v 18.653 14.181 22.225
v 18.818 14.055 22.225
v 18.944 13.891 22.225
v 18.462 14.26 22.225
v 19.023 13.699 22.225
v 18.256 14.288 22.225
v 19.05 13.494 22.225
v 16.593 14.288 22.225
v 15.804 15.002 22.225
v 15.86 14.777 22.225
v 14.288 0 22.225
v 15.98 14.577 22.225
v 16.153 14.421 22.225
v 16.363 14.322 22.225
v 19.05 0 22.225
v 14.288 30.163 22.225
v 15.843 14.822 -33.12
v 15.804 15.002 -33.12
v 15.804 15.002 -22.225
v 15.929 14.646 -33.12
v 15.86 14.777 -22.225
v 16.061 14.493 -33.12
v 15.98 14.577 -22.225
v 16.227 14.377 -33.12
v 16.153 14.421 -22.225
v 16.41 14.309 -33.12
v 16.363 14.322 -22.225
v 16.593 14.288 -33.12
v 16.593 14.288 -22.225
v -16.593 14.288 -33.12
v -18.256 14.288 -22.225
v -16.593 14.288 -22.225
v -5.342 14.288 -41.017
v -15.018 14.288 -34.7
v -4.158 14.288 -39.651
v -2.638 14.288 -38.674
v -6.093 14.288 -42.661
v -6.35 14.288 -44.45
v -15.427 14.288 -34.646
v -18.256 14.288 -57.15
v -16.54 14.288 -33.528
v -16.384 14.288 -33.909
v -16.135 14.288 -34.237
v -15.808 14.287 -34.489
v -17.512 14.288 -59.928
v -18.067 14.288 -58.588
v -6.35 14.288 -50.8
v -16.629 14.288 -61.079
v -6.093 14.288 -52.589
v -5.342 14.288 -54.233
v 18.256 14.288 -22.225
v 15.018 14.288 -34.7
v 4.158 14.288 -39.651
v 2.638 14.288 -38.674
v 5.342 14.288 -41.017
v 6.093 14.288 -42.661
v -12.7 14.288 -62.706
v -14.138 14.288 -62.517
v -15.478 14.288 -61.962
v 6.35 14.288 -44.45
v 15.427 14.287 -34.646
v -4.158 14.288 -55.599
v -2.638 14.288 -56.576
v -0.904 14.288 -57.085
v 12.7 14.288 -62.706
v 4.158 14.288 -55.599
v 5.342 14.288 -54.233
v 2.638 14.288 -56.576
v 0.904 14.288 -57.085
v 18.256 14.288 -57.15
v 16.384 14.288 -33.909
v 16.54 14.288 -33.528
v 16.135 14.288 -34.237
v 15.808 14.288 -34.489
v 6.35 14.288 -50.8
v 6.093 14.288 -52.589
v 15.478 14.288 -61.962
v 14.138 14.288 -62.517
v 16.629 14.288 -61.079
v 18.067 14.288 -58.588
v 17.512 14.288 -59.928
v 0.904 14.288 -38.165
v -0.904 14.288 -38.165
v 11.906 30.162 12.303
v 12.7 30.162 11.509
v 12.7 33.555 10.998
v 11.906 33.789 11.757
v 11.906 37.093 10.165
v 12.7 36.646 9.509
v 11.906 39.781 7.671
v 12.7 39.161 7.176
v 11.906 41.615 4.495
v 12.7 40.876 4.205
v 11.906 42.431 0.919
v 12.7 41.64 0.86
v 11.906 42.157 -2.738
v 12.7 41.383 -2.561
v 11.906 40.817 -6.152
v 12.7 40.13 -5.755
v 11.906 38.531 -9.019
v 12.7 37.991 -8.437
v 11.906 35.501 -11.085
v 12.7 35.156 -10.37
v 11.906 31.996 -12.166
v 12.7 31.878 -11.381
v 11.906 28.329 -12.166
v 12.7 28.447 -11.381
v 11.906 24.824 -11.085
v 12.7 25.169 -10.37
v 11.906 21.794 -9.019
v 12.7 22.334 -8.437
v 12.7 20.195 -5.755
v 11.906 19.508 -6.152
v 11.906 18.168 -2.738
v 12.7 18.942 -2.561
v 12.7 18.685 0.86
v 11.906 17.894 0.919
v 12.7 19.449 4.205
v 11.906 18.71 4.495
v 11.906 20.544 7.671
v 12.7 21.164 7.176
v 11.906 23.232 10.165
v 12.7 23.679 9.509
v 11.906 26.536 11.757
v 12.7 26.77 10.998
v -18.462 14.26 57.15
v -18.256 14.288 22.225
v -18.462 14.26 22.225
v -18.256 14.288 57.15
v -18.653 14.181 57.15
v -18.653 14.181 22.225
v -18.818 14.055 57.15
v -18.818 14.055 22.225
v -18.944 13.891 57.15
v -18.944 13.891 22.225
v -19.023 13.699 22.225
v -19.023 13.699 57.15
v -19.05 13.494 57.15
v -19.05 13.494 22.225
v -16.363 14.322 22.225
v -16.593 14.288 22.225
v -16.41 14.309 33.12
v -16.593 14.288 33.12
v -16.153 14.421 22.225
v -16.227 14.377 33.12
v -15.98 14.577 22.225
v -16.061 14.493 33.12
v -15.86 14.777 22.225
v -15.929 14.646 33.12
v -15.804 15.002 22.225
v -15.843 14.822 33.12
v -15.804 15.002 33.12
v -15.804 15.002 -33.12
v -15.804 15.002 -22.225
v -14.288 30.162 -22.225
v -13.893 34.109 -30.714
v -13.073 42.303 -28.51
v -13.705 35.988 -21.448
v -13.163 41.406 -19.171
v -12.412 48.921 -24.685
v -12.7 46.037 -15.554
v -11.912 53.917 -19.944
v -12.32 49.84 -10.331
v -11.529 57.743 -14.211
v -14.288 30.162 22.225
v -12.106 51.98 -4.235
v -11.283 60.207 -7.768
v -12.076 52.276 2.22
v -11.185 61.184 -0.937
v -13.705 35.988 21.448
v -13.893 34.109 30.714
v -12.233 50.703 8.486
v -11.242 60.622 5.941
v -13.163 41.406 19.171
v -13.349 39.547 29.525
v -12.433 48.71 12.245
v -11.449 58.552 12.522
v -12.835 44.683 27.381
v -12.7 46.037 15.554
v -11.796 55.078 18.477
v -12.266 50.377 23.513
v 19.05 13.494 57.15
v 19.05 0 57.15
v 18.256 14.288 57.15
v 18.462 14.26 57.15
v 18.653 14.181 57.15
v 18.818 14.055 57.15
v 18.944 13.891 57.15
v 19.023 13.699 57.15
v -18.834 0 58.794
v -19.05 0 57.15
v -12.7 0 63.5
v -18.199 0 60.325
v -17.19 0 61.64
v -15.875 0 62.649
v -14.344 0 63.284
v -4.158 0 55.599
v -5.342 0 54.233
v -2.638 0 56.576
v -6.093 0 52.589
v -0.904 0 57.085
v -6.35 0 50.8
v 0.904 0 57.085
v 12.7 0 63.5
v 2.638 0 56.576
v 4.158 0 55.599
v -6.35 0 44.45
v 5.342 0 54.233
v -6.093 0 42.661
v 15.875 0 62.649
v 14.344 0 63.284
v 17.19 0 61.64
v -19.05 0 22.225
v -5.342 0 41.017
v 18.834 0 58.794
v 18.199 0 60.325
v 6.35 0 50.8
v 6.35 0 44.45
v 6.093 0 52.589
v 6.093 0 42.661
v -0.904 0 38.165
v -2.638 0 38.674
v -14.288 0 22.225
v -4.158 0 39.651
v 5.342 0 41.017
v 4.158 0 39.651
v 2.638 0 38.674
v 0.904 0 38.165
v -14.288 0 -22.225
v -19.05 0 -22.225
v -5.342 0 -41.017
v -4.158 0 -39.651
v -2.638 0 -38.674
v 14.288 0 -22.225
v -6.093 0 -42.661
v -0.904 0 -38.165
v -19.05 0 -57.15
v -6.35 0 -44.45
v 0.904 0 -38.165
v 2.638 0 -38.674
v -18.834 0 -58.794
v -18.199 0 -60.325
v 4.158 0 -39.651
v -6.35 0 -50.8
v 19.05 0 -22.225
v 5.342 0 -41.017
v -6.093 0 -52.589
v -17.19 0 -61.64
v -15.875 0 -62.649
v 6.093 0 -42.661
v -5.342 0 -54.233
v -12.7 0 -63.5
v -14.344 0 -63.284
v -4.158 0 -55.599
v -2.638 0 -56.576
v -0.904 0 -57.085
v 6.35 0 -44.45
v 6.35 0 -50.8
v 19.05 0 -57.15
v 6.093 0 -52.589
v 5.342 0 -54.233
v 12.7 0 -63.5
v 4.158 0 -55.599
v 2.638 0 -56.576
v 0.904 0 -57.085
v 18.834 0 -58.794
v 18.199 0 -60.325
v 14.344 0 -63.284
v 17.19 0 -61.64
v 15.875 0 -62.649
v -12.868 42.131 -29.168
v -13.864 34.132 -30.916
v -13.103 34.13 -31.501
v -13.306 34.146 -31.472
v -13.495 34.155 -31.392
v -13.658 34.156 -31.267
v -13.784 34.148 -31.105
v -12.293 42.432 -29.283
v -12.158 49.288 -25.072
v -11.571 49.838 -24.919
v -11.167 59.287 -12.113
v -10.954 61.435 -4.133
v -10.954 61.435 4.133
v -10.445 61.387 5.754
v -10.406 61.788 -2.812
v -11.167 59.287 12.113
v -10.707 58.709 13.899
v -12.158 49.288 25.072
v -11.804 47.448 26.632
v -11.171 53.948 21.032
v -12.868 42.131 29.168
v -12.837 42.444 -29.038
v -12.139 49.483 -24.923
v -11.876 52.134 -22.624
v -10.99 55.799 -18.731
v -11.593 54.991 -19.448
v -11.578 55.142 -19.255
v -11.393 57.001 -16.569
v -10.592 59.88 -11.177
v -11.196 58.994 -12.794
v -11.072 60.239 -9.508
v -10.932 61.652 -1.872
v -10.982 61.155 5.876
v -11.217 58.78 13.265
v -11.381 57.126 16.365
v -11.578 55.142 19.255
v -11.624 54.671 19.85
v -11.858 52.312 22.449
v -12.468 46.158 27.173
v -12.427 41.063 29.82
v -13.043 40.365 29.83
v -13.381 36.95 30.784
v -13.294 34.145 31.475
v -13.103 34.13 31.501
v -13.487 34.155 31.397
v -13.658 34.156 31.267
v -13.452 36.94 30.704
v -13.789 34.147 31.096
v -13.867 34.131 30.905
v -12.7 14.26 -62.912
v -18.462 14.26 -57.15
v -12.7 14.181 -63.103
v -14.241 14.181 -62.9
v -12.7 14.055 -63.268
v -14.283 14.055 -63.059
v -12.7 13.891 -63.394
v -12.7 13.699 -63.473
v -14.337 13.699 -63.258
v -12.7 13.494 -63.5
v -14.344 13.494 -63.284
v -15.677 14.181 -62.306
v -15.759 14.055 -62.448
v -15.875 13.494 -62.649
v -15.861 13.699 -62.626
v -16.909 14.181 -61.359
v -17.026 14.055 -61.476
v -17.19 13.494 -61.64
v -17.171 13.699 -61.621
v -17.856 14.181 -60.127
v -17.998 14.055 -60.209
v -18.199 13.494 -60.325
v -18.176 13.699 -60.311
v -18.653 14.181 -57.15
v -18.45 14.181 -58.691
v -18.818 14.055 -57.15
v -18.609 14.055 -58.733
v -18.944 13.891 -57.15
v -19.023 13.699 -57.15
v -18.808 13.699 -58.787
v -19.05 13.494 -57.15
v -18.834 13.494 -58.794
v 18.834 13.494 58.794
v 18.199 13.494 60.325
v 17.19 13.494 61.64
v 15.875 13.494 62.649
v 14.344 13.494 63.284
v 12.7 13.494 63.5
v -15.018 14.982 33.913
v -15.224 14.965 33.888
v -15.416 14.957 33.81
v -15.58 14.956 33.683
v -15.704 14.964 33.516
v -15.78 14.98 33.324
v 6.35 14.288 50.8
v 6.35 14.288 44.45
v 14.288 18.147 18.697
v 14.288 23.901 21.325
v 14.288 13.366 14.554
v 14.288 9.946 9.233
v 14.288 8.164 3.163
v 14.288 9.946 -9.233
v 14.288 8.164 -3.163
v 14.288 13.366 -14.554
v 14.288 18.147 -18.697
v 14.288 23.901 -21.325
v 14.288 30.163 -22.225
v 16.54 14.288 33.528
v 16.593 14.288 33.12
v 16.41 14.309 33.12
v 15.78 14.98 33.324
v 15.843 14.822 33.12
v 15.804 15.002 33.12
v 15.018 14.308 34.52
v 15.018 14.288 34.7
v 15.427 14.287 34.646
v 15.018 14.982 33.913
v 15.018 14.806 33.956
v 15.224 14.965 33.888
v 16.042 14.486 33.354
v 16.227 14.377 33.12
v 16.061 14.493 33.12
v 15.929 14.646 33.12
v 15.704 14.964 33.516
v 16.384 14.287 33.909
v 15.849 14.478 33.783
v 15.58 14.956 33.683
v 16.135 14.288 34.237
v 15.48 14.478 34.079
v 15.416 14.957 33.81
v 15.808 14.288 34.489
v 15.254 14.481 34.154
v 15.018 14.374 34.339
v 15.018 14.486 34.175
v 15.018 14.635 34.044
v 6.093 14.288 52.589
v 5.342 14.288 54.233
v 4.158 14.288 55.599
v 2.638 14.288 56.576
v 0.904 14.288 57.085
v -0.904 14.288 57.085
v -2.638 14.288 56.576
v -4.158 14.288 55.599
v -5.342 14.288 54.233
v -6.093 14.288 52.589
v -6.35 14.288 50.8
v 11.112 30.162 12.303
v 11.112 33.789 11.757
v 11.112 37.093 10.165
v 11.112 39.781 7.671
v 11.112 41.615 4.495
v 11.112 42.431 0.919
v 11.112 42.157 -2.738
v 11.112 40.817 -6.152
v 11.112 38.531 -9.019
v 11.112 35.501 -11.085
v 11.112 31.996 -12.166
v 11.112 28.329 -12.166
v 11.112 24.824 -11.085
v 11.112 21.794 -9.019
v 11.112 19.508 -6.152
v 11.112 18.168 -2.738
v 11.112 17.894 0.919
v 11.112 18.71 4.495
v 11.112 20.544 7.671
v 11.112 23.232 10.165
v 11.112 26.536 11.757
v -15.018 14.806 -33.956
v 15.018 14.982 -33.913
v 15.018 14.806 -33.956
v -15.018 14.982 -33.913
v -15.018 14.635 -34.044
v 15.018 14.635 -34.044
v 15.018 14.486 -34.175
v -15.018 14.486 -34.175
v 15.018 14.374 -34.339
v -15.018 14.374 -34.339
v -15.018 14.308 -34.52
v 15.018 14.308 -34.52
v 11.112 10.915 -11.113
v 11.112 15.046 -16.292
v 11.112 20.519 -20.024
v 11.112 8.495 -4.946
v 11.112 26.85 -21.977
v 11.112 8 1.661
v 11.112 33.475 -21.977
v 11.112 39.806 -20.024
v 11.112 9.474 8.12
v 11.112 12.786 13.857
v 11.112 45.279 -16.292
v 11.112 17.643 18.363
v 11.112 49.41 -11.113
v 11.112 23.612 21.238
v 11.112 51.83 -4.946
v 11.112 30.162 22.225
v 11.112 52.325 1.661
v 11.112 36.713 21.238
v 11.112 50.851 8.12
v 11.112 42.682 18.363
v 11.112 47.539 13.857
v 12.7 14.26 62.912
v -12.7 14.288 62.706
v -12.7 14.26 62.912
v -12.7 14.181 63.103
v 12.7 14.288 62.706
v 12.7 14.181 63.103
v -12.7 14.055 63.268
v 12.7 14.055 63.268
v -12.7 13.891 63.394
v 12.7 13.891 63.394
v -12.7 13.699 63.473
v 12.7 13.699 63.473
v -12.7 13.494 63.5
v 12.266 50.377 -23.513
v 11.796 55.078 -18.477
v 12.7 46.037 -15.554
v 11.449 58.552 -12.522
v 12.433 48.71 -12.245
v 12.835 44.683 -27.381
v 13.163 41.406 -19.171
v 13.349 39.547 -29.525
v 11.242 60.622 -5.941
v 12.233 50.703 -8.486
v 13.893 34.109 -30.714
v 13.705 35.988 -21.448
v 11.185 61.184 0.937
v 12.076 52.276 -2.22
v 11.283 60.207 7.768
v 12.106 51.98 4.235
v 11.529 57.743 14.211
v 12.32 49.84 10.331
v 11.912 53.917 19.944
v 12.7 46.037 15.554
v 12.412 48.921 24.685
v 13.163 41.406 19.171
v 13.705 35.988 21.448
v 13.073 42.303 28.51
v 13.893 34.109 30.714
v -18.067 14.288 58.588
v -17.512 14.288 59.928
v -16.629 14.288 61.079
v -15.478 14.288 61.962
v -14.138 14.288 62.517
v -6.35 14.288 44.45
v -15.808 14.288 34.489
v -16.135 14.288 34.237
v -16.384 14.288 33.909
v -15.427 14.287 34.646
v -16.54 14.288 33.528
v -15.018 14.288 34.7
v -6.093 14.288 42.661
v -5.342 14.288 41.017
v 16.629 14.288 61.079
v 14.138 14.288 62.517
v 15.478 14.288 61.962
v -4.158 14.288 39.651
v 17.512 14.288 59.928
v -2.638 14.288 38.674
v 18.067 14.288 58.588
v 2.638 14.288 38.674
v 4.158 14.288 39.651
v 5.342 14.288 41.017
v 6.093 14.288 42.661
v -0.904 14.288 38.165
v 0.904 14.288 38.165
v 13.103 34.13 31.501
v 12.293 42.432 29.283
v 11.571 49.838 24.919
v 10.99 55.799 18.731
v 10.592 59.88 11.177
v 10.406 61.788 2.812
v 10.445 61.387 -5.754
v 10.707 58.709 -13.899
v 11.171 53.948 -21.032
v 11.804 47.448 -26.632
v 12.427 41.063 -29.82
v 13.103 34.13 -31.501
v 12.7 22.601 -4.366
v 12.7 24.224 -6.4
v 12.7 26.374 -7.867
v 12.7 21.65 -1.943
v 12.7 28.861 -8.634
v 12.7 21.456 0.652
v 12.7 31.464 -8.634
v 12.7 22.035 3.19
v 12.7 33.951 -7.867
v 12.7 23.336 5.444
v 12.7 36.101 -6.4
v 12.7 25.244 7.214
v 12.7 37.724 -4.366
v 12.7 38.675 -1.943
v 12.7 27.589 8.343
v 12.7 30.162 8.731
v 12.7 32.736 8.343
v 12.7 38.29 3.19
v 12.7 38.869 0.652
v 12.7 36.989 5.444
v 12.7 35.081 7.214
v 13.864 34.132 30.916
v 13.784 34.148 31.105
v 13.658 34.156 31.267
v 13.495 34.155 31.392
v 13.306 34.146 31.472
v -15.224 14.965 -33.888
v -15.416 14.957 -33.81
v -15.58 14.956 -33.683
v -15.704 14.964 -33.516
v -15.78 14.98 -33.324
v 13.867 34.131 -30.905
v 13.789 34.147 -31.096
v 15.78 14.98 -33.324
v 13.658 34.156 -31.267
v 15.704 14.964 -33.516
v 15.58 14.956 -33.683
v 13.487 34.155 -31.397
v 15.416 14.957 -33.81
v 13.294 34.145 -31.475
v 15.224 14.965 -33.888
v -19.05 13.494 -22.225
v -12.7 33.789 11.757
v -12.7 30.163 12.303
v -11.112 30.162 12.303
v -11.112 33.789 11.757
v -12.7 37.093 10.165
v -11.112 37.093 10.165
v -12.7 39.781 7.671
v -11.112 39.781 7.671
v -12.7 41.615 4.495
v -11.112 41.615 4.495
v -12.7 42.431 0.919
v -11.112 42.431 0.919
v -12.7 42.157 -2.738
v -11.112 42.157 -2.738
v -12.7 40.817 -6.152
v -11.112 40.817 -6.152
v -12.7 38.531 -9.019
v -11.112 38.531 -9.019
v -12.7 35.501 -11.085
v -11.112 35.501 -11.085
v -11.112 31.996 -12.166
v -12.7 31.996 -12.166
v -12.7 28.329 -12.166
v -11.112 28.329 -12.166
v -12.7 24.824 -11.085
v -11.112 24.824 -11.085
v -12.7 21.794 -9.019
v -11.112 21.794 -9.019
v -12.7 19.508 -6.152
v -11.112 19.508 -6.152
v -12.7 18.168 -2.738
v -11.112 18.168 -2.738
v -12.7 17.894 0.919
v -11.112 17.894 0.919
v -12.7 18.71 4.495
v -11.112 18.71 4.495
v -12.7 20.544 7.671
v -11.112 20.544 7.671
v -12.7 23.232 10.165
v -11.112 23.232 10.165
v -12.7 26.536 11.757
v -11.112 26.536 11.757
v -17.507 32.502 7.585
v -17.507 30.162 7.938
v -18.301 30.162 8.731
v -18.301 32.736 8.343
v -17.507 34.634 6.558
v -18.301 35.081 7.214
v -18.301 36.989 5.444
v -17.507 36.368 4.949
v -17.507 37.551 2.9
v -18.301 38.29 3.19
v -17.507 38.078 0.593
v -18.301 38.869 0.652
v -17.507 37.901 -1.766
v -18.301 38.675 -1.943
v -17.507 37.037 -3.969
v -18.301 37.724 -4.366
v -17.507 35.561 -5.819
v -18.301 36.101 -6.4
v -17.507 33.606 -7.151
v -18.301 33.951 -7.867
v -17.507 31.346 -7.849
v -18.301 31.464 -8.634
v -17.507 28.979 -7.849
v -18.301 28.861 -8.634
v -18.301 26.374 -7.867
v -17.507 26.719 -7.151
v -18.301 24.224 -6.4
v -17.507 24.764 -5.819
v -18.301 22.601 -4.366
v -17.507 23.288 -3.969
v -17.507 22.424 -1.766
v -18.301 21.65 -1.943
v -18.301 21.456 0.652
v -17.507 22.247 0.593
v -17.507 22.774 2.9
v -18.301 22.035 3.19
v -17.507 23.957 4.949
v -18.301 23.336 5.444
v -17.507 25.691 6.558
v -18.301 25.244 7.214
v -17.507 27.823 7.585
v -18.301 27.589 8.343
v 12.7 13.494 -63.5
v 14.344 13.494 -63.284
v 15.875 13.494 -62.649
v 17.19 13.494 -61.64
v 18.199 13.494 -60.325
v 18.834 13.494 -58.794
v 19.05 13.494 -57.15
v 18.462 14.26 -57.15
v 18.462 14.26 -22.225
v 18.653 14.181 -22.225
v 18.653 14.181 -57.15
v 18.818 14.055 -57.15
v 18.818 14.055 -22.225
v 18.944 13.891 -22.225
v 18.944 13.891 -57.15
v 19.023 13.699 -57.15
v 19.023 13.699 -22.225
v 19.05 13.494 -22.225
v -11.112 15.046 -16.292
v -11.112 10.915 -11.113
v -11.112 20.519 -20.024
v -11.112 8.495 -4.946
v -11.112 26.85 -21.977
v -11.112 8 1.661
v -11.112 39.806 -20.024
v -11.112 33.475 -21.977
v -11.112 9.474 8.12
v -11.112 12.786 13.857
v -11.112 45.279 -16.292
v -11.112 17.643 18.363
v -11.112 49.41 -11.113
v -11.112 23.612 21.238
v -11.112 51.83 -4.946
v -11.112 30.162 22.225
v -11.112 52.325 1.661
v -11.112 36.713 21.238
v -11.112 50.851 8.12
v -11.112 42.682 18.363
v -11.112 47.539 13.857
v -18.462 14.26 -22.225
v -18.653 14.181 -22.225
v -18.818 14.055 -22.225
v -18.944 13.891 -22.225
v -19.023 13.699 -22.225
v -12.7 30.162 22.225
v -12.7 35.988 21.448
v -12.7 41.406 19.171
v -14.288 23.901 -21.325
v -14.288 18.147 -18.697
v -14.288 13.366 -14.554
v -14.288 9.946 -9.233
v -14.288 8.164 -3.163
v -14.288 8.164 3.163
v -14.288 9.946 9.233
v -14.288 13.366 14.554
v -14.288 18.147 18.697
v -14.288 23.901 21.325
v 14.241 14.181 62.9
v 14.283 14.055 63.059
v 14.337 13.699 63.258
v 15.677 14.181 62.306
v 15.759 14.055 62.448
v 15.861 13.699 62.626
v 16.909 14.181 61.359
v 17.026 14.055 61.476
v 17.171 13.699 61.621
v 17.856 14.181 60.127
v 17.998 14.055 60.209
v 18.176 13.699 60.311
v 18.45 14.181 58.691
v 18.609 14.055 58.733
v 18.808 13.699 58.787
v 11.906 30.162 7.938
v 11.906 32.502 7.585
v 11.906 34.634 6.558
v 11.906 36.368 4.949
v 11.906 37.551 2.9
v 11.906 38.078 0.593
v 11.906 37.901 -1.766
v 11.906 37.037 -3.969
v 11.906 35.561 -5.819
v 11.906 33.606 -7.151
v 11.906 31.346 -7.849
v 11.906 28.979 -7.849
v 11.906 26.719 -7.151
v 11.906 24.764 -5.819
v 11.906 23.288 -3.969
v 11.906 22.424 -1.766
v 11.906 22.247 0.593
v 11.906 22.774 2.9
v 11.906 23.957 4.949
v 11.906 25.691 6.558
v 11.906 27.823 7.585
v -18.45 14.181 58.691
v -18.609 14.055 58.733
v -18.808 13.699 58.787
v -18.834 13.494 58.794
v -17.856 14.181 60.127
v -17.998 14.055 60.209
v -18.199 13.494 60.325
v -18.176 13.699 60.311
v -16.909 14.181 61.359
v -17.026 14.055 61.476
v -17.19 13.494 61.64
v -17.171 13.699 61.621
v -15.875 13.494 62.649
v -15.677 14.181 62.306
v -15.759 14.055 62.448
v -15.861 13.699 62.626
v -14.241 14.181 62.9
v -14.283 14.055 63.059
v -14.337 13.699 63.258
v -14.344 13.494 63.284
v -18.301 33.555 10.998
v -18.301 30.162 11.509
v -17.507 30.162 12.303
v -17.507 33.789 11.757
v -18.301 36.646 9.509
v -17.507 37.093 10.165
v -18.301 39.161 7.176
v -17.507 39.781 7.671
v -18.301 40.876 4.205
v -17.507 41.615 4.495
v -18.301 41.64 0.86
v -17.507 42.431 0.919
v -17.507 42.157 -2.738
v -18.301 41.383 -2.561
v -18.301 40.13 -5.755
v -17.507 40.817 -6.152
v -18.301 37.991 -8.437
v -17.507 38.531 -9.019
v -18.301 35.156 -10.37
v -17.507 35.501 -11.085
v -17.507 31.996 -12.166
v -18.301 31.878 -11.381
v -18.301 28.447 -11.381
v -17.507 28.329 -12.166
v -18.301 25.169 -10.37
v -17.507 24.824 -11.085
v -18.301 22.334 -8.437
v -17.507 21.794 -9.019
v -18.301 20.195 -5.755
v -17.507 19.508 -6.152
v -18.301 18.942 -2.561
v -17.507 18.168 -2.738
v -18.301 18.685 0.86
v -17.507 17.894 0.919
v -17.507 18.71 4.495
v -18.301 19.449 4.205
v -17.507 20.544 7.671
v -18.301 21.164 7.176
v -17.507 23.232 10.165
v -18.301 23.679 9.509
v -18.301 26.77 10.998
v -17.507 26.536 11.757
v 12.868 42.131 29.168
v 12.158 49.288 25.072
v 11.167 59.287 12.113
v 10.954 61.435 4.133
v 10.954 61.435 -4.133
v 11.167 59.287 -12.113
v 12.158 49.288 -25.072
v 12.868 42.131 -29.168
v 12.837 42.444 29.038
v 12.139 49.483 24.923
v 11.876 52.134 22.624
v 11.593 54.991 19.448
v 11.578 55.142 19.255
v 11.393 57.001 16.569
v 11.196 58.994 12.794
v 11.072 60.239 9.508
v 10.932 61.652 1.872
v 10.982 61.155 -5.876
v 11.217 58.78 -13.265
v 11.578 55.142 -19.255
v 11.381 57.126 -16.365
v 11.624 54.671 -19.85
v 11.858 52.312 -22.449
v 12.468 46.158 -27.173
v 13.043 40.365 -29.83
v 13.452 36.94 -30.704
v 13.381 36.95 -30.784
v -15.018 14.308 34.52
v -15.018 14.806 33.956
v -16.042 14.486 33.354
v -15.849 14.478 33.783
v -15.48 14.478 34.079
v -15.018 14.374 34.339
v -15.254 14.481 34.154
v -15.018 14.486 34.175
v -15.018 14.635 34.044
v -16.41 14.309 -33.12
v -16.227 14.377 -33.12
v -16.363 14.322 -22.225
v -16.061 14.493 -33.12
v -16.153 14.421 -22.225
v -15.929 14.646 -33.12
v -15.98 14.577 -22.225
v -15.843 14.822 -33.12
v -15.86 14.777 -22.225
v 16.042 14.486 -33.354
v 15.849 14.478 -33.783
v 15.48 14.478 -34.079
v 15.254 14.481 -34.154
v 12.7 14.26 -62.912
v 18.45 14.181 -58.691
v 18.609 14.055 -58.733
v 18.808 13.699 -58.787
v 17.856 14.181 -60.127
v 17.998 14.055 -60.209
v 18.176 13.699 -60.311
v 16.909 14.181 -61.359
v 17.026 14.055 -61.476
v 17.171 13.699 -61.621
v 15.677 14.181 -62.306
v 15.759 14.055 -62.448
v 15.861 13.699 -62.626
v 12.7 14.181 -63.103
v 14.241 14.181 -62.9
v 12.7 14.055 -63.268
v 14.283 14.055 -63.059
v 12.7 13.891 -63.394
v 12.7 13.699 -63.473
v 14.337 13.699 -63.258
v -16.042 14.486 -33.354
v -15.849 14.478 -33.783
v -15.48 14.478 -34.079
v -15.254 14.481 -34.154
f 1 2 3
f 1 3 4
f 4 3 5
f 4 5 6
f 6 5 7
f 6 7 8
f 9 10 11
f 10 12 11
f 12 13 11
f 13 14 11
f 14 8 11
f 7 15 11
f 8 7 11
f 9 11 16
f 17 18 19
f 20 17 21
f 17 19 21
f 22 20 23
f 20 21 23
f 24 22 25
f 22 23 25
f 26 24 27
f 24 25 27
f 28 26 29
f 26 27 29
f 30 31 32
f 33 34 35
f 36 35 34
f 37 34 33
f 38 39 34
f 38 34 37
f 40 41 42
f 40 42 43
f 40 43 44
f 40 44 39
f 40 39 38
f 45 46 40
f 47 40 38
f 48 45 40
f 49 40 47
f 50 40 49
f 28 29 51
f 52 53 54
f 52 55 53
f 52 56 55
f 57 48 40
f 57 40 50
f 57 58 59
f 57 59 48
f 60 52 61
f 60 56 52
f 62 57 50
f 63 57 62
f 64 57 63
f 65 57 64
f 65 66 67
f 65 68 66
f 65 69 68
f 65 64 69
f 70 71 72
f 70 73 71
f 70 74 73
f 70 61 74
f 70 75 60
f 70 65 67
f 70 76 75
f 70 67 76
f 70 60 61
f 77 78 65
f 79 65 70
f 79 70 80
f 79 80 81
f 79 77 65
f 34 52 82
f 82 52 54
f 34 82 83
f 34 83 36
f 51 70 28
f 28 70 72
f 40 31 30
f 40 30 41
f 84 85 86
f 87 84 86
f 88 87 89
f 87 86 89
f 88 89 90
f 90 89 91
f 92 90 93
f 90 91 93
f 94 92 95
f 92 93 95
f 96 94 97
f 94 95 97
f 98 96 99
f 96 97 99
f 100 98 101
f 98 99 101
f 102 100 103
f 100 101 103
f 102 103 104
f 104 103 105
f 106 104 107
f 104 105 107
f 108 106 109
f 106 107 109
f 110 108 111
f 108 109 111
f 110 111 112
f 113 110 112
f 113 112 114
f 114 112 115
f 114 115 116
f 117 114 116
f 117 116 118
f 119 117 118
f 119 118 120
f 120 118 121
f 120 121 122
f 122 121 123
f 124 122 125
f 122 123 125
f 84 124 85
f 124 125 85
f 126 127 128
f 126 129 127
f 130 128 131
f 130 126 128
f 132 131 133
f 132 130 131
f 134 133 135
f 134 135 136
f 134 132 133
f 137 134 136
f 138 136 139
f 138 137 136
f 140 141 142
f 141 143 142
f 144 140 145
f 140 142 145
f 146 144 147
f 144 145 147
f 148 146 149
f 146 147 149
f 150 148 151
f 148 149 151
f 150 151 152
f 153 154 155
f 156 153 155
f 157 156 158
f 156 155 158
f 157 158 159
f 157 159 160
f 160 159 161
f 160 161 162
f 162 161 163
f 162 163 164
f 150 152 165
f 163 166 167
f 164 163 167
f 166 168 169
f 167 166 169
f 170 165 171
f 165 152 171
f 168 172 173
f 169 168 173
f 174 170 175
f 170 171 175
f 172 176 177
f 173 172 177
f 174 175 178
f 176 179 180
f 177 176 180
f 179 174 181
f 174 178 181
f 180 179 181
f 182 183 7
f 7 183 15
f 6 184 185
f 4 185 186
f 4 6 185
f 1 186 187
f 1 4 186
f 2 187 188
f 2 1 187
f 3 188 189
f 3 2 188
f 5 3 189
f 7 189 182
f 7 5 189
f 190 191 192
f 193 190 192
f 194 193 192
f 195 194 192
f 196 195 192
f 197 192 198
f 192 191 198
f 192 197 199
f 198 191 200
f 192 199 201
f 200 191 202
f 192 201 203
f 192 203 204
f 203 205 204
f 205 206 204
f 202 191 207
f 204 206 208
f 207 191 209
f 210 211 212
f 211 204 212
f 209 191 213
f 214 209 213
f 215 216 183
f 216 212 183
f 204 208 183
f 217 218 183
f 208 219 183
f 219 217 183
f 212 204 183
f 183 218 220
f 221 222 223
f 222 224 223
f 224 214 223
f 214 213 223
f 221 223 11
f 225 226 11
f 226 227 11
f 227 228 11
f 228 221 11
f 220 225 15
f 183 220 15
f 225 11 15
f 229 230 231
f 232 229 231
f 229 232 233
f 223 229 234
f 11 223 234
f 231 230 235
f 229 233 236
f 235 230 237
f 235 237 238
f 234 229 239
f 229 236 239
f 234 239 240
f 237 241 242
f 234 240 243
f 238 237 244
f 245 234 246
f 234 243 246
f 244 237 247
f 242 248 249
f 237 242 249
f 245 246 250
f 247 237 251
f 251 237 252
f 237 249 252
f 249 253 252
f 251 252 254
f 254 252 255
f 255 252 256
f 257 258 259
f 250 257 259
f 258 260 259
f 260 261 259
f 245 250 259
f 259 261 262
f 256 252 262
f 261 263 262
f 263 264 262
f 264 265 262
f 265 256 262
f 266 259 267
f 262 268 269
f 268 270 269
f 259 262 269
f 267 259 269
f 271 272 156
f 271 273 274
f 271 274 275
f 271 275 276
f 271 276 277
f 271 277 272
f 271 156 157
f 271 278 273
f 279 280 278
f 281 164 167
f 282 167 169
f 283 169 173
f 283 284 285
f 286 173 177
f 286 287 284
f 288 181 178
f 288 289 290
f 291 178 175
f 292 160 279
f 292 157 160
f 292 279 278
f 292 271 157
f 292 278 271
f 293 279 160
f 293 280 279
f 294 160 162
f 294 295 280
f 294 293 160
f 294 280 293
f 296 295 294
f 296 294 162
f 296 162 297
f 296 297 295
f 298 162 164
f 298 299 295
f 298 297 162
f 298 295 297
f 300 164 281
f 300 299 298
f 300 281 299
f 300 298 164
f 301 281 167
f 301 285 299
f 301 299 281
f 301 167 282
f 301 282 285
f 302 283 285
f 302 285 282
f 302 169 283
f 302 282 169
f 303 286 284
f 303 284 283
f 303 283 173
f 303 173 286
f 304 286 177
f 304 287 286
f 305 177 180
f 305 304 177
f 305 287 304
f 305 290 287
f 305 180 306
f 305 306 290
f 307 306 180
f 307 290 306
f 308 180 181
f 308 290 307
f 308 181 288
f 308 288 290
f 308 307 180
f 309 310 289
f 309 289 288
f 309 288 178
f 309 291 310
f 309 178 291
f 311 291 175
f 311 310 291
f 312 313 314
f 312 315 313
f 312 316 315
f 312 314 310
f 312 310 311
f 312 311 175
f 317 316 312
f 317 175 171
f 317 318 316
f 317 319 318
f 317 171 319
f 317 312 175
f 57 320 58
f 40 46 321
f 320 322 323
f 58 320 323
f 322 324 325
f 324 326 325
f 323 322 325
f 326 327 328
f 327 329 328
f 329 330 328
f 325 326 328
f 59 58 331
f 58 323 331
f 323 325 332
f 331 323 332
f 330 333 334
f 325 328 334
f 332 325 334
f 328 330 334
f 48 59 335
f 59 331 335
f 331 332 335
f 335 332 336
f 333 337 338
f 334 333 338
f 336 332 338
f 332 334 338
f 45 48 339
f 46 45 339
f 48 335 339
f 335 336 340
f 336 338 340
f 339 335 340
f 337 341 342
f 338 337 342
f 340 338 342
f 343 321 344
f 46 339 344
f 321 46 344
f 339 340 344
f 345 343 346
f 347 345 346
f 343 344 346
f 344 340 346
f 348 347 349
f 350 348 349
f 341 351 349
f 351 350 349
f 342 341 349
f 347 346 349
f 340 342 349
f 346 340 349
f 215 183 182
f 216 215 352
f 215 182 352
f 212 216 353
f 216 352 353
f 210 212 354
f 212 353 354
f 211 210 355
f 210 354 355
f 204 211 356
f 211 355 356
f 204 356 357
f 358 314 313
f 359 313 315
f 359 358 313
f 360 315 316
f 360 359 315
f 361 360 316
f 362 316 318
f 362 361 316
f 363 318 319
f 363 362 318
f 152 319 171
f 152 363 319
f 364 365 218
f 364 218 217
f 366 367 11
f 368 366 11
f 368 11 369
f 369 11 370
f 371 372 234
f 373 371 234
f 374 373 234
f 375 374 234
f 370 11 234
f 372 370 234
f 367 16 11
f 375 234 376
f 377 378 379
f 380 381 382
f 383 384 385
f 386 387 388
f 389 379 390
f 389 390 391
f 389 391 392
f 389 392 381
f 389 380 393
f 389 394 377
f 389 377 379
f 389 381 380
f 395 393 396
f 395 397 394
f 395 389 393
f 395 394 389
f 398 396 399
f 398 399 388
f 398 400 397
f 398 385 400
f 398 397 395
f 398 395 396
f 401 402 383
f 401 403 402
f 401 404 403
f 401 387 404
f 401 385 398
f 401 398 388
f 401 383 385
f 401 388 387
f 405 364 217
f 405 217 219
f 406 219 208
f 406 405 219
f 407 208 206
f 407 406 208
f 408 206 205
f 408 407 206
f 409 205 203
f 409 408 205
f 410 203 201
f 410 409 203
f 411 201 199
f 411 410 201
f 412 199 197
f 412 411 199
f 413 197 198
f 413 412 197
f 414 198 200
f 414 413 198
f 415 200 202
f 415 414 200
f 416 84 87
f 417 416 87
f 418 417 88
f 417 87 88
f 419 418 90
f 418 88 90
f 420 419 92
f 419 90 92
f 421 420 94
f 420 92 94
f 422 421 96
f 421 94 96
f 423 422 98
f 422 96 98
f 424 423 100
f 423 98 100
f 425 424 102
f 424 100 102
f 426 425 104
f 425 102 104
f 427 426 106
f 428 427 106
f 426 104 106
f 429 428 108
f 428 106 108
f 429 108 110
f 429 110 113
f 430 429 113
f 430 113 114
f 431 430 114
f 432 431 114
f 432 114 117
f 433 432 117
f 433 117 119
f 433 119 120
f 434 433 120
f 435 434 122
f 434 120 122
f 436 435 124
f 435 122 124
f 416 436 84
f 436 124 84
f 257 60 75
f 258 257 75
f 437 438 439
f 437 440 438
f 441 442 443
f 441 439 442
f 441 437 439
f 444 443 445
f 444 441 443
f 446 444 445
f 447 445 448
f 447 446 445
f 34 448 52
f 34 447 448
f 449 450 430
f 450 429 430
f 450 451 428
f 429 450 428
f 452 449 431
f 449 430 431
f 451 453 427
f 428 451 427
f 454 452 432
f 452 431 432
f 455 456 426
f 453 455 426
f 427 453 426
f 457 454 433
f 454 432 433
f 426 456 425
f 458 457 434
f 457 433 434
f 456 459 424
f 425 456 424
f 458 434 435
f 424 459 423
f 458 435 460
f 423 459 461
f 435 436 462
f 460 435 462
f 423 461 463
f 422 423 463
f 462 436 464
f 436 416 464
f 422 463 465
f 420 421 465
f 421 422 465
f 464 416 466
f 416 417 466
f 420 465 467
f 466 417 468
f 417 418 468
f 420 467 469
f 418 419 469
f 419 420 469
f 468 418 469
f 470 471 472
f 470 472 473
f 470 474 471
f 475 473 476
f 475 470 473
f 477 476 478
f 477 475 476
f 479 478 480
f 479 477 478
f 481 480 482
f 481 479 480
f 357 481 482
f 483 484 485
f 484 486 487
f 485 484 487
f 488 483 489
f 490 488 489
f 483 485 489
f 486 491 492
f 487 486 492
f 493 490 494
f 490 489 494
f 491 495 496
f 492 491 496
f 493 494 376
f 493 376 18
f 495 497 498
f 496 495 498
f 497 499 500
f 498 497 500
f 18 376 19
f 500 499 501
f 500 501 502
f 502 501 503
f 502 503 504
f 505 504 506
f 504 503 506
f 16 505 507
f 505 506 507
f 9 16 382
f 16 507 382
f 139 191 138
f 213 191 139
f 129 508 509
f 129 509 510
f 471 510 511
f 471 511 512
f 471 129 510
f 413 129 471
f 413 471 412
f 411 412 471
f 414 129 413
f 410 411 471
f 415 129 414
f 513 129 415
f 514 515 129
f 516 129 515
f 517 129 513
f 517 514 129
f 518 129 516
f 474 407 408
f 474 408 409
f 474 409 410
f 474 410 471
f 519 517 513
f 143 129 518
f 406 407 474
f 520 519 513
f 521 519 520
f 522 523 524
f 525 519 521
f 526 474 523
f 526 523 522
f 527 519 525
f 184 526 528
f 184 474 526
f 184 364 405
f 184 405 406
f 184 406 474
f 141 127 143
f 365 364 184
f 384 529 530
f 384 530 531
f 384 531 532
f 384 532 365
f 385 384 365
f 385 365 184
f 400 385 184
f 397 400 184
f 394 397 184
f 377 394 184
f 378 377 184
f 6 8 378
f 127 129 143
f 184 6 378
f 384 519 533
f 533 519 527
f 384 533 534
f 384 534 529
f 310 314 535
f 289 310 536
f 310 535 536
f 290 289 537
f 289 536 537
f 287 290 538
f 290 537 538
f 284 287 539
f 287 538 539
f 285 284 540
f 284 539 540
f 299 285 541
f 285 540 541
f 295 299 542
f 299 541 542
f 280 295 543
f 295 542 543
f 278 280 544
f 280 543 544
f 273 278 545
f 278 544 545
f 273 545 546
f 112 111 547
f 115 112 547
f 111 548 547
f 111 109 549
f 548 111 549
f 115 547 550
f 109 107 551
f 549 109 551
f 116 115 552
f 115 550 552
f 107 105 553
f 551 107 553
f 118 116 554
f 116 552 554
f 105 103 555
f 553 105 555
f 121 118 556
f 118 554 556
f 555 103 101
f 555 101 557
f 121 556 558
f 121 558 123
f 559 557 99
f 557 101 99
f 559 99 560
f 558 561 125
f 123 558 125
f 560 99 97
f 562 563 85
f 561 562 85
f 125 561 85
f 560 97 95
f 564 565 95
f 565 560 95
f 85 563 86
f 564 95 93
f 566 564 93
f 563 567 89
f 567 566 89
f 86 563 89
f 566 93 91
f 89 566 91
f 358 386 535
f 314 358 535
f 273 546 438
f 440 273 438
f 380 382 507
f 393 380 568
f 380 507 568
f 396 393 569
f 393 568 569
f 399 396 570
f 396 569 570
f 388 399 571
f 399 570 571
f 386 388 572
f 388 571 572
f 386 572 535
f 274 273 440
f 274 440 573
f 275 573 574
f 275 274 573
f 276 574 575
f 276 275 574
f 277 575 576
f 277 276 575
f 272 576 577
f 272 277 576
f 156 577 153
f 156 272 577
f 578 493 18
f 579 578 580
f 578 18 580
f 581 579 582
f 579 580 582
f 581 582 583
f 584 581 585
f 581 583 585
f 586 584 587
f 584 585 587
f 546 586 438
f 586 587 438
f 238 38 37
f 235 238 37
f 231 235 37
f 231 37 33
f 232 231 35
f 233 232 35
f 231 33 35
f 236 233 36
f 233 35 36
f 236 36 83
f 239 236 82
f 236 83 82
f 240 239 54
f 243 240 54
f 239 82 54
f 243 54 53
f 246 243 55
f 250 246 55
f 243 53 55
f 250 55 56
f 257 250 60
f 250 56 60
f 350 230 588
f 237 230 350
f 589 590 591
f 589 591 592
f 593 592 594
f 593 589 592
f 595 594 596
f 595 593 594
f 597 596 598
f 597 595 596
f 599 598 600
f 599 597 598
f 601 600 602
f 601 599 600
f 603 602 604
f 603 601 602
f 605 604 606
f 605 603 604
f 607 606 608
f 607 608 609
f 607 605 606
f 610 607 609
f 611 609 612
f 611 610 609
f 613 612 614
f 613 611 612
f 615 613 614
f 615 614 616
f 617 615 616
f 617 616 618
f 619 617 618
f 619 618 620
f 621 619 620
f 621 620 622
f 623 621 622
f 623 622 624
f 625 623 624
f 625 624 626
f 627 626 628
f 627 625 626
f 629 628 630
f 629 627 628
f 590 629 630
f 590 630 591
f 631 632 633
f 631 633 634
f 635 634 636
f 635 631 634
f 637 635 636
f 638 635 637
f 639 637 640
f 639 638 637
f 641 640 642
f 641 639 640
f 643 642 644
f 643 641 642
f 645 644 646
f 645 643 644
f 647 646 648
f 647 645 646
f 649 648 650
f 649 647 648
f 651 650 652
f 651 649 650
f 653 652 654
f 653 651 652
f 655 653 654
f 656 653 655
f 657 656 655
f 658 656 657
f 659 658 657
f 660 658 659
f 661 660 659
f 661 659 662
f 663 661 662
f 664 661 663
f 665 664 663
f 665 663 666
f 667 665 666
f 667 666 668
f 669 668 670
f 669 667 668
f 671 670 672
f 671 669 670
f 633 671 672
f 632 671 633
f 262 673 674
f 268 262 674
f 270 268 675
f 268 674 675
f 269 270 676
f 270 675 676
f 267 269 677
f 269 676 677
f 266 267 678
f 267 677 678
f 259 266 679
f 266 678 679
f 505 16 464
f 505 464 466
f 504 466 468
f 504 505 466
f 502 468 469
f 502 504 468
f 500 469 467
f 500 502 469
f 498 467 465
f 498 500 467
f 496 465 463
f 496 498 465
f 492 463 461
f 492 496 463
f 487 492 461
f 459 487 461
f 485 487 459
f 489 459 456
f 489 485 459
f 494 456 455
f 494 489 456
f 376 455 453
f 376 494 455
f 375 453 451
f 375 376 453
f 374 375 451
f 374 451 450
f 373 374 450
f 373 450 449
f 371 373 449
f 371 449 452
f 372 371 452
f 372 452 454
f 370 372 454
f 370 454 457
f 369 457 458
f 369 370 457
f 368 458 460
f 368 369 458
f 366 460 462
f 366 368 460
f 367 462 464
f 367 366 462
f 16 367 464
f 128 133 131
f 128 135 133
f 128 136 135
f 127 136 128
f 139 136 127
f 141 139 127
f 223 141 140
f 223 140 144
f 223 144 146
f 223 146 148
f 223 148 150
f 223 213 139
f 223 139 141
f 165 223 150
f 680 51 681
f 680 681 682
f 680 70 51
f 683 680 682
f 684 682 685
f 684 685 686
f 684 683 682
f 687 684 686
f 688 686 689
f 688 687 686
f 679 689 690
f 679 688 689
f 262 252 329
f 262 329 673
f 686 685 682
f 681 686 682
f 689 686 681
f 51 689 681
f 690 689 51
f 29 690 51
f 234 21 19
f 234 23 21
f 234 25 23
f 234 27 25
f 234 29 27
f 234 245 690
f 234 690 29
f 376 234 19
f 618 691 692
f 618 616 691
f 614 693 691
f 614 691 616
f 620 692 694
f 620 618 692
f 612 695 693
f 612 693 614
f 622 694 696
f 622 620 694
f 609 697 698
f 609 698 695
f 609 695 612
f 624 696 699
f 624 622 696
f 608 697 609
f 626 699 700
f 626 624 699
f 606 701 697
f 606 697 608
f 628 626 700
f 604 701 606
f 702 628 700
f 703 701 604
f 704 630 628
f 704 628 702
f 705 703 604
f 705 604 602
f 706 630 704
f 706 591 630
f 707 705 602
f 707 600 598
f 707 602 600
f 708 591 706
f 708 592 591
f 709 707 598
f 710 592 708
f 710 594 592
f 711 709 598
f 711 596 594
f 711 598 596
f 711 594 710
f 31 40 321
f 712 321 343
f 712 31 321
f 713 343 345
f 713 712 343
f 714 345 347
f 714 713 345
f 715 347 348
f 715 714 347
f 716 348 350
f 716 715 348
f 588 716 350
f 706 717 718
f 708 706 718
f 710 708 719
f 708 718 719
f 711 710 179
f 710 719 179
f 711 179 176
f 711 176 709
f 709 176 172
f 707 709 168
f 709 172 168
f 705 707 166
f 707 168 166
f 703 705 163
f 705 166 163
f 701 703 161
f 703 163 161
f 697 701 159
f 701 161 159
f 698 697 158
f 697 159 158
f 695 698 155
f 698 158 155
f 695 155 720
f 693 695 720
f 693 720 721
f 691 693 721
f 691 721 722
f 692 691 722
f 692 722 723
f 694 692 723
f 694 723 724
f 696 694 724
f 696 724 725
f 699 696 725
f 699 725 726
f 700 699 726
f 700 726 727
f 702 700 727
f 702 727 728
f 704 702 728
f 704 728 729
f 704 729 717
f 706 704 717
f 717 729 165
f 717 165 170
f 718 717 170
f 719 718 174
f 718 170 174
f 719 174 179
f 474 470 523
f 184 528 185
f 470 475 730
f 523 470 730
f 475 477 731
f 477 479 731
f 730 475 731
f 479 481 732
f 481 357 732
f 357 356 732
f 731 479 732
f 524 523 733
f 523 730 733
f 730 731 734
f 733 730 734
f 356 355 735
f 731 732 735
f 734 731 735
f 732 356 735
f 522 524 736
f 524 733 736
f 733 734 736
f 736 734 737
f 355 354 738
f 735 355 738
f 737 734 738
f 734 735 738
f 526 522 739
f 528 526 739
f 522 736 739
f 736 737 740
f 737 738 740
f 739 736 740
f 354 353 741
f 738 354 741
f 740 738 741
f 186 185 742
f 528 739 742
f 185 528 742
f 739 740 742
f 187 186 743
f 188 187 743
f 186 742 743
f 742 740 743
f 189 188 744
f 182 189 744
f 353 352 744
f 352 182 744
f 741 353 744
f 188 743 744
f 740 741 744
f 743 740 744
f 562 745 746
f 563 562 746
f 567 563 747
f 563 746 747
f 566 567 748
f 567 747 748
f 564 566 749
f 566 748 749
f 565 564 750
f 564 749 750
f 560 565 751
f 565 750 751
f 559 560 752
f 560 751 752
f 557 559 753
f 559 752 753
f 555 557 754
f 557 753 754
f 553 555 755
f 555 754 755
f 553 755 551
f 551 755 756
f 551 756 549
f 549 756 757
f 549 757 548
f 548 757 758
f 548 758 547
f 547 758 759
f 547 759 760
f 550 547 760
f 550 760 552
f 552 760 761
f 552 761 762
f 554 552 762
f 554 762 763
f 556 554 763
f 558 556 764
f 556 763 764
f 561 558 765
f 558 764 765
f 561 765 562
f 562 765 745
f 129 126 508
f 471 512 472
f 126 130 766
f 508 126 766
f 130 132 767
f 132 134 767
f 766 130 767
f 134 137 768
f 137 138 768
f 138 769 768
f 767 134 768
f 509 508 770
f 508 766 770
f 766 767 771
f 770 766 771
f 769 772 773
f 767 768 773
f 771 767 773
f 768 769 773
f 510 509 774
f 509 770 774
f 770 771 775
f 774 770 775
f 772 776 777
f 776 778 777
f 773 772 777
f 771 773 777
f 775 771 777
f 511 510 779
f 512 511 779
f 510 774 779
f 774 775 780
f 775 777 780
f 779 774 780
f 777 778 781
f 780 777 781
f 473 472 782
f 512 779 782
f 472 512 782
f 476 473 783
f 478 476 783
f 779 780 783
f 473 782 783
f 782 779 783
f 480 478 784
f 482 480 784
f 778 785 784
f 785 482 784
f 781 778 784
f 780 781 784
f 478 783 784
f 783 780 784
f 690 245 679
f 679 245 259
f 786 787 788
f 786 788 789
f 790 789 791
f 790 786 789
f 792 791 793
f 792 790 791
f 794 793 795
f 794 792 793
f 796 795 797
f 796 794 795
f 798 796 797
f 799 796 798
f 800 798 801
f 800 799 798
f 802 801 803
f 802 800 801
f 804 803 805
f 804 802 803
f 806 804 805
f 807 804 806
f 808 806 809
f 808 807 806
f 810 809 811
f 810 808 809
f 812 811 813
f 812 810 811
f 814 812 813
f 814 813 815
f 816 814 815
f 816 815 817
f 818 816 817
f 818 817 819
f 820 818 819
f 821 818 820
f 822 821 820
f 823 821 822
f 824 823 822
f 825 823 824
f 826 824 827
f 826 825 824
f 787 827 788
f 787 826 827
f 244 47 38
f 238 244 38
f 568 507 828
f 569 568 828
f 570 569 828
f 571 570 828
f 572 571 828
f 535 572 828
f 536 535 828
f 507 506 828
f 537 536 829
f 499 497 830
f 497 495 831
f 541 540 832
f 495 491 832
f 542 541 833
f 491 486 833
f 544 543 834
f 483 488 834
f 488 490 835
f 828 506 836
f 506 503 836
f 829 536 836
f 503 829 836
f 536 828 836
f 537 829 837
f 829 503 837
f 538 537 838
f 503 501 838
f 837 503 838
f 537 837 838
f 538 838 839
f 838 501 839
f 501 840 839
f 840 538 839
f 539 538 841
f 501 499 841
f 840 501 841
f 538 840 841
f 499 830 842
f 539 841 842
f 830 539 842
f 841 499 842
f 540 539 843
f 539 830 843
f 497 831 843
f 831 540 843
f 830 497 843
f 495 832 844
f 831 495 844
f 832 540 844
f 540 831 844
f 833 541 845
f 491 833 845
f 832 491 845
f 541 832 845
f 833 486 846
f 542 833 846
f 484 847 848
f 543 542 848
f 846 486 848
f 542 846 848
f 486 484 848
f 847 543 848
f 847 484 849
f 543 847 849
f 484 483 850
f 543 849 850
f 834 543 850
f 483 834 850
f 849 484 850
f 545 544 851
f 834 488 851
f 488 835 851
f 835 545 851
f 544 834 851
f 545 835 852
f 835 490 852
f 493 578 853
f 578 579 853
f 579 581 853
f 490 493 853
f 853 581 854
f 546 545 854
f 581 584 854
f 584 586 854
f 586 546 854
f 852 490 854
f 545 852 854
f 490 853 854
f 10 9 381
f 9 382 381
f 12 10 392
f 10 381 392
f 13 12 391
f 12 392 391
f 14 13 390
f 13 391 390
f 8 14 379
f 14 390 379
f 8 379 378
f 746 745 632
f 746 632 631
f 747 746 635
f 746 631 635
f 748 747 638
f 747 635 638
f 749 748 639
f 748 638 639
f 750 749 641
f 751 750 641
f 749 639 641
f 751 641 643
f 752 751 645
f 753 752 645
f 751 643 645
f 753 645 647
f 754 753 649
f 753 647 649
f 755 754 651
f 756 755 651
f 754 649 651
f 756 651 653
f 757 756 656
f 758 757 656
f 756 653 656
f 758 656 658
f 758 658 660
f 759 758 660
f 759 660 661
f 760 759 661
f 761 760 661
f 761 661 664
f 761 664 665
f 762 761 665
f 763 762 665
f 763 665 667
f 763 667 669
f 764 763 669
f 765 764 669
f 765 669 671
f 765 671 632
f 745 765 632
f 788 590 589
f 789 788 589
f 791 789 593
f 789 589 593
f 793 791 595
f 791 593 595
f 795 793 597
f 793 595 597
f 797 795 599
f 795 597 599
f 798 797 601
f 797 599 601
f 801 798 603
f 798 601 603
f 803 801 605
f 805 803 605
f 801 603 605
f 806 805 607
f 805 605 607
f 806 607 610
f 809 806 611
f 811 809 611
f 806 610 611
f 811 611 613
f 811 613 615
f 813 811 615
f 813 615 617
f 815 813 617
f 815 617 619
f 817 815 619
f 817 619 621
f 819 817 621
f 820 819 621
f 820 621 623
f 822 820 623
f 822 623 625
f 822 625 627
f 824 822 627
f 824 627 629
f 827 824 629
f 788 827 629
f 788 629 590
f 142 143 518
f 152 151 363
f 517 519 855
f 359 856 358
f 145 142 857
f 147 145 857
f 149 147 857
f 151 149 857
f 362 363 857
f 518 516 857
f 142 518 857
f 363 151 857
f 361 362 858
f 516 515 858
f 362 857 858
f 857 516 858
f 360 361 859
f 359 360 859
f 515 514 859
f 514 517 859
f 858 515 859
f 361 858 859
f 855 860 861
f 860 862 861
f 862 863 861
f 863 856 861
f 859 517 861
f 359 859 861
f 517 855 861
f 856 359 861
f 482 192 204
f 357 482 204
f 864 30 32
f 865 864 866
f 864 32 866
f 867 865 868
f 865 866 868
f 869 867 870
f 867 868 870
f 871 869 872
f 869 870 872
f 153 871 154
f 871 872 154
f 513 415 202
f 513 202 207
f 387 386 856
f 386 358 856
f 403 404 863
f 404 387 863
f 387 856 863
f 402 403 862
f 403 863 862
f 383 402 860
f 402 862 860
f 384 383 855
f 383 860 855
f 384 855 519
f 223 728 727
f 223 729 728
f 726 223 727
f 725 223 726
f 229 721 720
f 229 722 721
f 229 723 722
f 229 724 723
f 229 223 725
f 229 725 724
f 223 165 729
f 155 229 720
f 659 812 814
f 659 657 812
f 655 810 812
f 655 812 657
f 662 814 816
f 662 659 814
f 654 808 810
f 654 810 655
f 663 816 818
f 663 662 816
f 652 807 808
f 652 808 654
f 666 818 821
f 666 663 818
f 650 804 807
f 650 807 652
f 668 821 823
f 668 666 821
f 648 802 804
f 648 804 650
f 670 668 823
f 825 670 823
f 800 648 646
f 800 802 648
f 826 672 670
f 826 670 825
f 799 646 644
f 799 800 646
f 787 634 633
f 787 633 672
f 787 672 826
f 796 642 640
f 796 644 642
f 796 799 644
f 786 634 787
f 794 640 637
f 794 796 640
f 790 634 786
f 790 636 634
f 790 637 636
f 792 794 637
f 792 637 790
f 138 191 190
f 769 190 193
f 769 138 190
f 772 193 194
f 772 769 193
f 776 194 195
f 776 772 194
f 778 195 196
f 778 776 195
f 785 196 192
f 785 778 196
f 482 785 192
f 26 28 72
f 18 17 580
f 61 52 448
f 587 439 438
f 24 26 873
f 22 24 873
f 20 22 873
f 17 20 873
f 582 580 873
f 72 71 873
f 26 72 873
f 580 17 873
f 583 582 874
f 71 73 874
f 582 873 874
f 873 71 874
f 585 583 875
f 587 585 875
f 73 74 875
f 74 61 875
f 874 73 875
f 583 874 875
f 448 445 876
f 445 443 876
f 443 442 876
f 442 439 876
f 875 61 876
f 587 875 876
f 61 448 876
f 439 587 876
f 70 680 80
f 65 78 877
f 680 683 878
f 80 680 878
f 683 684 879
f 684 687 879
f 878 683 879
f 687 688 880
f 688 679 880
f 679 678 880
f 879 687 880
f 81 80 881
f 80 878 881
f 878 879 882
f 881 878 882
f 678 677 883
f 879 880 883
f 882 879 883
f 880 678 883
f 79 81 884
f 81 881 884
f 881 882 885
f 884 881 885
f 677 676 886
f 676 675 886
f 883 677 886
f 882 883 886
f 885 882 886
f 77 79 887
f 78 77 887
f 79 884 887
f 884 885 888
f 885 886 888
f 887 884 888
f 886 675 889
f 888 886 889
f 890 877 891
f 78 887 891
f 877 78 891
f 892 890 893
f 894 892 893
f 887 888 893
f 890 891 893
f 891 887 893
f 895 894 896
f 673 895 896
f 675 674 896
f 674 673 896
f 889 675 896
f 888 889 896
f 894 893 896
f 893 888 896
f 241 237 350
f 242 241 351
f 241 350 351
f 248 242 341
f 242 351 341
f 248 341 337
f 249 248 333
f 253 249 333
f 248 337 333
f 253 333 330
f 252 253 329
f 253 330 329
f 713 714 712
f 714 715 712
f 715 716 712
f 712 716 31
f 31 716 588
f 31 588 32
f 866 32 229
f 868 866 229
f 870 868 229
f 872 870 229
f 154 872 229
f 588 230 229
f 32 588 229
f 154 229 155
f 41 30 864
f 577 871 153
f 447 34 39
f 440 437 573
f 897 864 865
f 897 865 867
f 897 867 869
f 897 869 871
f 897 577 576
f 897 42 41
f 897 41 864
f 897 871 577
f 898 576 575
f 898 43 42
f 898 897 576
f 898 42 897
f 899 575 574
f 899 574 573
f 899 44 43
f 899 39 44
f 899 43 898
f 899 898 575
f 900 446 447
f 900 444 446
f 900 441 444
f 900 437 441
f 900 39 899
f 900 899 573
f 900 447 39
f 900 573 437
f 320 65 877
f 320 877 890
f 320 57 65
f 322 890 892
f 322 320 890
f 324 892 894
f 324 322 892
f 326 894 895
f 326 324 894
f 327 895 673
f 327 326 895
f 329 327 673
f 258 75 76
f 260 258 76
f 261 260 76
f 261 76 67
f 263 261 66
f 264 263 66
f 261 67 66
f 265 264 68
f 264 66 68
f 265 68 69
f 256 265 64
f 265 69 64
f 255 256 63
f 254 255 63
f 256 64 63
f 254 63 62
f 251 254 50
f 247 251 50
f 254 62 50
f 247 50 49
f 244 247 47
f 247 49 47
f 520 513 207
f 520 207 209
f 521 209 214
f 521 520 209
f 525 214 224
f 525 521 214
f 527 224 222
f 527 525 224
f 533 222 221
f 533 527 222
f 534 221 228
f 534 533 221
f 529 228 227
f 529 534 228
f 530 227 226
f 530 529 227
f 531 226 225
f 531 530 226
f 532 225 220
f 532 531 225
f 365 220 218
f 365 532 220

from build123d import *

# Parameters (mm, degrees)
SKETCH1_W           = 38.1
SKETCH1_H           = 127
BOSS_EXTRUDE1_DEPTH = 14.2875
BOSS_EXTRUDE2_DEPTH = 34
CUT_EXTRUDE1_DEPTH  = 25.4
SKETCH4_W           = 4.7625
SKETCH4_H           = 44.45
CUT_EXTRUDE2_DEPTH  = 62.9125
SKETCH6_R           = 22.225
CUT_EXTRUDE4_DEPTH  = 6.35
CUT_EXTRUDE5_DEPTH  = 15.2875
SKETCH8_R           = 12.303125
BOSS_EXTRUDE3_DEPTH = 31.0007
SKETCH9_R           = 7.9375
CUT_EXTRUDE6_DEPTH  = 38.3507
SKETCH10_R          = 22.225
SKETCH10_R_2        = 12.303125
CUT_EXTRUDE7_DEPTH  = 1.5875
FILLET1_R           = 6.35
FILLET3_R           = 0.79375
CHAMFER2_SIZE       = 0.79375
FILLET5_R           = 0.79375


with BuildPart() as part:
    # Sketch1 → Boss-Extrude1 (new body)
    with BuildSketch(Plane(origin=(0, 0, 0), x_dir=(1, 0, 0), z_dir=(0, 1, 0))):
        Rectangle(SKETCH1_W, SKETCH1_H)
    extrude(amount=BOSS_EXTRUDE1_DEPTH)

    # Sketch2 → Boss-Extrude2 (add, symmetric)
    with BuildSketch(Plane.XY):
        Polygon((-15.875, 14.2875), (-11.1125, 61.9125), (11.1125, 61.9125), (15.875, 14.2875), align=None)
    extrude(amount=BOSS_EXTRUDE2_DEPTH, both=True)

    # Sketch3 → Cut-Extrude1 (cut, symmetric)
    with BuildSketch(Plane(origin=(0, 0, 0), x_dir=(0, 0, -1), z_dir=(1, 0, 0))):
        with BuildLine():
            Line((-34, 14.2875), (-31.501184031, 34.129602806))
            ThreePointArc((-31.501184031, 34.129602806), (0, 61.9125), (31.501184031, 34.129602806))
            Line((31.501184031, 34.129602806), (34, 14.2875))
            Line((34, 14.2875), (34, 65.0875))
            Line((34, 65.0875), (-34, 65.0875))
            Line((-34, 65.0875), (-34, 14.2875))
        make_face()
    extrude(amount=CUT_EXTRUDE1_DEPTH, both=True, mode=Mode.SUBTRACT)

    # Sketch4 → Cut-Extrude2 (cut, through all)
    with BuildSketch(Plane(origin=(0, 0, 0), x_dir=(1, 0, 0), z_dir=(0, 1, 0))):
        with Locations((-16.66875, 0)):
            Rectangle(SKETCH4_W, SKETCH4_H)
    cut_extrude2 = extrude(amount=CUT_EXTRUDE2_DEPTH, mode=Mode.SUBTRACT)

    # Sketch6 → Cut-Extrude4 (cut)
    with BuildSketch(Plane.ZY.offset(19.05)):
        with Locations((0, 30.1625)):
            Circle(SKETCH6_R)
    cut_extrude4 = extrude(amount=-CUT_EXTRUDE4_DEPTH, mode=Mode.SUBTRACT)

    # Sketch7 → Cut-Extrude5 (cut, through all)
    with BuildSketch(Plane(origin=(0, 14.2875, 0), x_dir=(1, 0, 0), z_dir=(0, 1, 0))):
        with BuildLine():
            Line((6.35, -44.45), (6.35, -50.8))
            ThreePointArc((6.35, -50.8), (0, -57.15), (-6.35, -50.8))
            Line((-6.35, -50.8), (-6.35, -44.45))
            ThreePointArc((-6.35, -44.45), (0, -38.1), (6.35, -44.45))
        make_face()
        with BuildLine():
            Line((6.35, 44.45), (6.35, 50.8))
            ThreePointArc((6.35, 50.8), (0, 57.15), (-6.35, 50.8))
            Line((-6.35, 50.8), (-6.35, 44.45))
            ThreePointArc((-6.35, 44.45), (0, 38.1), (6.35, 44.45))
        make_face()
    extrude(amount=-CUT_EXTRUDE5_DEPTH, mode=Mode.SUBTRACT)

    # Sketch8 → Boss-Extrude3 (add)
    with BuildSketch(Plane.ZY.offset(-12.7)):
        with Locations((0, 30.1625)):
            Circle(SKETCH8_R)
    extrude(amount=BOSS_EXTRUDE3_DEPTH)

    # Sketch9 → Cut-Extrude6 (cut, through all)
    with BuildSketch(Plane.ZY.offset(18.3007)):
        with Locations((0, 30.1625)):
            Circle(SKETCH9_R)
    extrude(amount=-CUT_EXTRUDE6_DEPTH, mode=Mode.SUBTRACT)

    # Sketch10 → Cut-Extrude7 (cut)
    with BuildSketch(Plane.ZY.offset(12.7)):
        with Locations((0, 30.1625)):
            Circle(SKETCH10_R)
        with Locations((0, 30.1625)):
            Circle(SKETCH10_R_2, mode=Mode.SUBTRACT)
    cut_extrude7 = extrude(amount=-CUT_EXTRUDE7_DEPTH, mode=Mode.SUBTRACT)

    # Mirror2: Cut-Extrude2, Cut-Extrude4, Cut-Extrude7 across plane
    add(cut_extrude2.mirror(Plane(origin=(0, 0, 0), x_dir=(0, 0, 1), z_dir=(1, 0, 0))), mode=Mode.SUBTRACT)
    add(cut_extrude4.mirror(Plane(origin=(0, 0, 0), x_dir=(0, 0, 1), z_dir=(1, 0, 0))), mode=Mode.SUBTRACT)
    add(cut_extrude7.mirror(Plane(origin=(0, 0, 0), x_dir=(0, 0, 1), z_dir=(1, 0, 0))), mode=Mode.SUBTRACT)

    # Fillet1
    fillet1_edges = [part.edges().sort_by_distance(p)[0] for p in [
        (19.05, 7.14375, 63.5),
        (-19.05, 7.14375, 63.5),
        (-19.05, 7.14375, -63.5),
        (19.05, 7.14375, -63.5),
    ]]
    fillet(fillet1_edges, radius=FILLET1_R)

    # Fillet3
    fillet3_edges = [part.edges().sort_by_distance(p)[0] for p in [
        (19.05, 14.2875, -39.6875),
        (0, 14.2875, -63.5),
        (-19.05, 14.2875, -39.6875),
        (-17.190128061, 14.2875, -61.640128061),
        (17.190128061, 14.2875, -61.640128061),
        (19.05, 14.2875, 39.6875),
        (0, 14.2875, 63.5),
        (-17.190128061, 14.2875, 61.640128061),
        (17.190128061, 14.2875, 61.640128061),
        (-19.05, 14.2875, 39.6875),
    ]]
    fillet(fillet3_edges, radius=FILLET3_R)

    # Chamfer2
    chamfer2_edges = [part.edges().sort_by_distance(p)[0] for p in [
        (-18.3007, 30.1625, -12.303125),
        (-18.3007, 30.1625, -7.9375),
        (12.7, 30.1625, -7.9375),
        (12.7, 30.1625, -12.303125),
    ]]
    chamfer(chamfer2_edges, length=CHAMFER2_SIZE)

    # Fillet5
    fillet5_edges = [part.edges().sort_by_distance(p)[0] for p in [
        (15.875, 14.2875, -28.1125),
        (0, 14.2875, -34),
        (-15.875, 14.2875, 28.1125),
        (15.875, 14.2875, 28.1125),
        (0, 14.2875, 34),
        (-11.908575206, 53.951747942, 21.026987001),
        (11.908575206, 53.951747942, -21.026987001),
        (14.88289486, 24.208551403, 32.750592015),
        (-14.88289486, 24.208551403, 32.750592015),
        (14.88289486, 24.208551403, -32.750592015),
        (-14.88289486, 24.208551403, -32.750592015),
        (-15.875, 14.2875, -28.1125),
    ]]
    fillet(fillet5_edges, radius=FILLET5_R)


solid = part.part
